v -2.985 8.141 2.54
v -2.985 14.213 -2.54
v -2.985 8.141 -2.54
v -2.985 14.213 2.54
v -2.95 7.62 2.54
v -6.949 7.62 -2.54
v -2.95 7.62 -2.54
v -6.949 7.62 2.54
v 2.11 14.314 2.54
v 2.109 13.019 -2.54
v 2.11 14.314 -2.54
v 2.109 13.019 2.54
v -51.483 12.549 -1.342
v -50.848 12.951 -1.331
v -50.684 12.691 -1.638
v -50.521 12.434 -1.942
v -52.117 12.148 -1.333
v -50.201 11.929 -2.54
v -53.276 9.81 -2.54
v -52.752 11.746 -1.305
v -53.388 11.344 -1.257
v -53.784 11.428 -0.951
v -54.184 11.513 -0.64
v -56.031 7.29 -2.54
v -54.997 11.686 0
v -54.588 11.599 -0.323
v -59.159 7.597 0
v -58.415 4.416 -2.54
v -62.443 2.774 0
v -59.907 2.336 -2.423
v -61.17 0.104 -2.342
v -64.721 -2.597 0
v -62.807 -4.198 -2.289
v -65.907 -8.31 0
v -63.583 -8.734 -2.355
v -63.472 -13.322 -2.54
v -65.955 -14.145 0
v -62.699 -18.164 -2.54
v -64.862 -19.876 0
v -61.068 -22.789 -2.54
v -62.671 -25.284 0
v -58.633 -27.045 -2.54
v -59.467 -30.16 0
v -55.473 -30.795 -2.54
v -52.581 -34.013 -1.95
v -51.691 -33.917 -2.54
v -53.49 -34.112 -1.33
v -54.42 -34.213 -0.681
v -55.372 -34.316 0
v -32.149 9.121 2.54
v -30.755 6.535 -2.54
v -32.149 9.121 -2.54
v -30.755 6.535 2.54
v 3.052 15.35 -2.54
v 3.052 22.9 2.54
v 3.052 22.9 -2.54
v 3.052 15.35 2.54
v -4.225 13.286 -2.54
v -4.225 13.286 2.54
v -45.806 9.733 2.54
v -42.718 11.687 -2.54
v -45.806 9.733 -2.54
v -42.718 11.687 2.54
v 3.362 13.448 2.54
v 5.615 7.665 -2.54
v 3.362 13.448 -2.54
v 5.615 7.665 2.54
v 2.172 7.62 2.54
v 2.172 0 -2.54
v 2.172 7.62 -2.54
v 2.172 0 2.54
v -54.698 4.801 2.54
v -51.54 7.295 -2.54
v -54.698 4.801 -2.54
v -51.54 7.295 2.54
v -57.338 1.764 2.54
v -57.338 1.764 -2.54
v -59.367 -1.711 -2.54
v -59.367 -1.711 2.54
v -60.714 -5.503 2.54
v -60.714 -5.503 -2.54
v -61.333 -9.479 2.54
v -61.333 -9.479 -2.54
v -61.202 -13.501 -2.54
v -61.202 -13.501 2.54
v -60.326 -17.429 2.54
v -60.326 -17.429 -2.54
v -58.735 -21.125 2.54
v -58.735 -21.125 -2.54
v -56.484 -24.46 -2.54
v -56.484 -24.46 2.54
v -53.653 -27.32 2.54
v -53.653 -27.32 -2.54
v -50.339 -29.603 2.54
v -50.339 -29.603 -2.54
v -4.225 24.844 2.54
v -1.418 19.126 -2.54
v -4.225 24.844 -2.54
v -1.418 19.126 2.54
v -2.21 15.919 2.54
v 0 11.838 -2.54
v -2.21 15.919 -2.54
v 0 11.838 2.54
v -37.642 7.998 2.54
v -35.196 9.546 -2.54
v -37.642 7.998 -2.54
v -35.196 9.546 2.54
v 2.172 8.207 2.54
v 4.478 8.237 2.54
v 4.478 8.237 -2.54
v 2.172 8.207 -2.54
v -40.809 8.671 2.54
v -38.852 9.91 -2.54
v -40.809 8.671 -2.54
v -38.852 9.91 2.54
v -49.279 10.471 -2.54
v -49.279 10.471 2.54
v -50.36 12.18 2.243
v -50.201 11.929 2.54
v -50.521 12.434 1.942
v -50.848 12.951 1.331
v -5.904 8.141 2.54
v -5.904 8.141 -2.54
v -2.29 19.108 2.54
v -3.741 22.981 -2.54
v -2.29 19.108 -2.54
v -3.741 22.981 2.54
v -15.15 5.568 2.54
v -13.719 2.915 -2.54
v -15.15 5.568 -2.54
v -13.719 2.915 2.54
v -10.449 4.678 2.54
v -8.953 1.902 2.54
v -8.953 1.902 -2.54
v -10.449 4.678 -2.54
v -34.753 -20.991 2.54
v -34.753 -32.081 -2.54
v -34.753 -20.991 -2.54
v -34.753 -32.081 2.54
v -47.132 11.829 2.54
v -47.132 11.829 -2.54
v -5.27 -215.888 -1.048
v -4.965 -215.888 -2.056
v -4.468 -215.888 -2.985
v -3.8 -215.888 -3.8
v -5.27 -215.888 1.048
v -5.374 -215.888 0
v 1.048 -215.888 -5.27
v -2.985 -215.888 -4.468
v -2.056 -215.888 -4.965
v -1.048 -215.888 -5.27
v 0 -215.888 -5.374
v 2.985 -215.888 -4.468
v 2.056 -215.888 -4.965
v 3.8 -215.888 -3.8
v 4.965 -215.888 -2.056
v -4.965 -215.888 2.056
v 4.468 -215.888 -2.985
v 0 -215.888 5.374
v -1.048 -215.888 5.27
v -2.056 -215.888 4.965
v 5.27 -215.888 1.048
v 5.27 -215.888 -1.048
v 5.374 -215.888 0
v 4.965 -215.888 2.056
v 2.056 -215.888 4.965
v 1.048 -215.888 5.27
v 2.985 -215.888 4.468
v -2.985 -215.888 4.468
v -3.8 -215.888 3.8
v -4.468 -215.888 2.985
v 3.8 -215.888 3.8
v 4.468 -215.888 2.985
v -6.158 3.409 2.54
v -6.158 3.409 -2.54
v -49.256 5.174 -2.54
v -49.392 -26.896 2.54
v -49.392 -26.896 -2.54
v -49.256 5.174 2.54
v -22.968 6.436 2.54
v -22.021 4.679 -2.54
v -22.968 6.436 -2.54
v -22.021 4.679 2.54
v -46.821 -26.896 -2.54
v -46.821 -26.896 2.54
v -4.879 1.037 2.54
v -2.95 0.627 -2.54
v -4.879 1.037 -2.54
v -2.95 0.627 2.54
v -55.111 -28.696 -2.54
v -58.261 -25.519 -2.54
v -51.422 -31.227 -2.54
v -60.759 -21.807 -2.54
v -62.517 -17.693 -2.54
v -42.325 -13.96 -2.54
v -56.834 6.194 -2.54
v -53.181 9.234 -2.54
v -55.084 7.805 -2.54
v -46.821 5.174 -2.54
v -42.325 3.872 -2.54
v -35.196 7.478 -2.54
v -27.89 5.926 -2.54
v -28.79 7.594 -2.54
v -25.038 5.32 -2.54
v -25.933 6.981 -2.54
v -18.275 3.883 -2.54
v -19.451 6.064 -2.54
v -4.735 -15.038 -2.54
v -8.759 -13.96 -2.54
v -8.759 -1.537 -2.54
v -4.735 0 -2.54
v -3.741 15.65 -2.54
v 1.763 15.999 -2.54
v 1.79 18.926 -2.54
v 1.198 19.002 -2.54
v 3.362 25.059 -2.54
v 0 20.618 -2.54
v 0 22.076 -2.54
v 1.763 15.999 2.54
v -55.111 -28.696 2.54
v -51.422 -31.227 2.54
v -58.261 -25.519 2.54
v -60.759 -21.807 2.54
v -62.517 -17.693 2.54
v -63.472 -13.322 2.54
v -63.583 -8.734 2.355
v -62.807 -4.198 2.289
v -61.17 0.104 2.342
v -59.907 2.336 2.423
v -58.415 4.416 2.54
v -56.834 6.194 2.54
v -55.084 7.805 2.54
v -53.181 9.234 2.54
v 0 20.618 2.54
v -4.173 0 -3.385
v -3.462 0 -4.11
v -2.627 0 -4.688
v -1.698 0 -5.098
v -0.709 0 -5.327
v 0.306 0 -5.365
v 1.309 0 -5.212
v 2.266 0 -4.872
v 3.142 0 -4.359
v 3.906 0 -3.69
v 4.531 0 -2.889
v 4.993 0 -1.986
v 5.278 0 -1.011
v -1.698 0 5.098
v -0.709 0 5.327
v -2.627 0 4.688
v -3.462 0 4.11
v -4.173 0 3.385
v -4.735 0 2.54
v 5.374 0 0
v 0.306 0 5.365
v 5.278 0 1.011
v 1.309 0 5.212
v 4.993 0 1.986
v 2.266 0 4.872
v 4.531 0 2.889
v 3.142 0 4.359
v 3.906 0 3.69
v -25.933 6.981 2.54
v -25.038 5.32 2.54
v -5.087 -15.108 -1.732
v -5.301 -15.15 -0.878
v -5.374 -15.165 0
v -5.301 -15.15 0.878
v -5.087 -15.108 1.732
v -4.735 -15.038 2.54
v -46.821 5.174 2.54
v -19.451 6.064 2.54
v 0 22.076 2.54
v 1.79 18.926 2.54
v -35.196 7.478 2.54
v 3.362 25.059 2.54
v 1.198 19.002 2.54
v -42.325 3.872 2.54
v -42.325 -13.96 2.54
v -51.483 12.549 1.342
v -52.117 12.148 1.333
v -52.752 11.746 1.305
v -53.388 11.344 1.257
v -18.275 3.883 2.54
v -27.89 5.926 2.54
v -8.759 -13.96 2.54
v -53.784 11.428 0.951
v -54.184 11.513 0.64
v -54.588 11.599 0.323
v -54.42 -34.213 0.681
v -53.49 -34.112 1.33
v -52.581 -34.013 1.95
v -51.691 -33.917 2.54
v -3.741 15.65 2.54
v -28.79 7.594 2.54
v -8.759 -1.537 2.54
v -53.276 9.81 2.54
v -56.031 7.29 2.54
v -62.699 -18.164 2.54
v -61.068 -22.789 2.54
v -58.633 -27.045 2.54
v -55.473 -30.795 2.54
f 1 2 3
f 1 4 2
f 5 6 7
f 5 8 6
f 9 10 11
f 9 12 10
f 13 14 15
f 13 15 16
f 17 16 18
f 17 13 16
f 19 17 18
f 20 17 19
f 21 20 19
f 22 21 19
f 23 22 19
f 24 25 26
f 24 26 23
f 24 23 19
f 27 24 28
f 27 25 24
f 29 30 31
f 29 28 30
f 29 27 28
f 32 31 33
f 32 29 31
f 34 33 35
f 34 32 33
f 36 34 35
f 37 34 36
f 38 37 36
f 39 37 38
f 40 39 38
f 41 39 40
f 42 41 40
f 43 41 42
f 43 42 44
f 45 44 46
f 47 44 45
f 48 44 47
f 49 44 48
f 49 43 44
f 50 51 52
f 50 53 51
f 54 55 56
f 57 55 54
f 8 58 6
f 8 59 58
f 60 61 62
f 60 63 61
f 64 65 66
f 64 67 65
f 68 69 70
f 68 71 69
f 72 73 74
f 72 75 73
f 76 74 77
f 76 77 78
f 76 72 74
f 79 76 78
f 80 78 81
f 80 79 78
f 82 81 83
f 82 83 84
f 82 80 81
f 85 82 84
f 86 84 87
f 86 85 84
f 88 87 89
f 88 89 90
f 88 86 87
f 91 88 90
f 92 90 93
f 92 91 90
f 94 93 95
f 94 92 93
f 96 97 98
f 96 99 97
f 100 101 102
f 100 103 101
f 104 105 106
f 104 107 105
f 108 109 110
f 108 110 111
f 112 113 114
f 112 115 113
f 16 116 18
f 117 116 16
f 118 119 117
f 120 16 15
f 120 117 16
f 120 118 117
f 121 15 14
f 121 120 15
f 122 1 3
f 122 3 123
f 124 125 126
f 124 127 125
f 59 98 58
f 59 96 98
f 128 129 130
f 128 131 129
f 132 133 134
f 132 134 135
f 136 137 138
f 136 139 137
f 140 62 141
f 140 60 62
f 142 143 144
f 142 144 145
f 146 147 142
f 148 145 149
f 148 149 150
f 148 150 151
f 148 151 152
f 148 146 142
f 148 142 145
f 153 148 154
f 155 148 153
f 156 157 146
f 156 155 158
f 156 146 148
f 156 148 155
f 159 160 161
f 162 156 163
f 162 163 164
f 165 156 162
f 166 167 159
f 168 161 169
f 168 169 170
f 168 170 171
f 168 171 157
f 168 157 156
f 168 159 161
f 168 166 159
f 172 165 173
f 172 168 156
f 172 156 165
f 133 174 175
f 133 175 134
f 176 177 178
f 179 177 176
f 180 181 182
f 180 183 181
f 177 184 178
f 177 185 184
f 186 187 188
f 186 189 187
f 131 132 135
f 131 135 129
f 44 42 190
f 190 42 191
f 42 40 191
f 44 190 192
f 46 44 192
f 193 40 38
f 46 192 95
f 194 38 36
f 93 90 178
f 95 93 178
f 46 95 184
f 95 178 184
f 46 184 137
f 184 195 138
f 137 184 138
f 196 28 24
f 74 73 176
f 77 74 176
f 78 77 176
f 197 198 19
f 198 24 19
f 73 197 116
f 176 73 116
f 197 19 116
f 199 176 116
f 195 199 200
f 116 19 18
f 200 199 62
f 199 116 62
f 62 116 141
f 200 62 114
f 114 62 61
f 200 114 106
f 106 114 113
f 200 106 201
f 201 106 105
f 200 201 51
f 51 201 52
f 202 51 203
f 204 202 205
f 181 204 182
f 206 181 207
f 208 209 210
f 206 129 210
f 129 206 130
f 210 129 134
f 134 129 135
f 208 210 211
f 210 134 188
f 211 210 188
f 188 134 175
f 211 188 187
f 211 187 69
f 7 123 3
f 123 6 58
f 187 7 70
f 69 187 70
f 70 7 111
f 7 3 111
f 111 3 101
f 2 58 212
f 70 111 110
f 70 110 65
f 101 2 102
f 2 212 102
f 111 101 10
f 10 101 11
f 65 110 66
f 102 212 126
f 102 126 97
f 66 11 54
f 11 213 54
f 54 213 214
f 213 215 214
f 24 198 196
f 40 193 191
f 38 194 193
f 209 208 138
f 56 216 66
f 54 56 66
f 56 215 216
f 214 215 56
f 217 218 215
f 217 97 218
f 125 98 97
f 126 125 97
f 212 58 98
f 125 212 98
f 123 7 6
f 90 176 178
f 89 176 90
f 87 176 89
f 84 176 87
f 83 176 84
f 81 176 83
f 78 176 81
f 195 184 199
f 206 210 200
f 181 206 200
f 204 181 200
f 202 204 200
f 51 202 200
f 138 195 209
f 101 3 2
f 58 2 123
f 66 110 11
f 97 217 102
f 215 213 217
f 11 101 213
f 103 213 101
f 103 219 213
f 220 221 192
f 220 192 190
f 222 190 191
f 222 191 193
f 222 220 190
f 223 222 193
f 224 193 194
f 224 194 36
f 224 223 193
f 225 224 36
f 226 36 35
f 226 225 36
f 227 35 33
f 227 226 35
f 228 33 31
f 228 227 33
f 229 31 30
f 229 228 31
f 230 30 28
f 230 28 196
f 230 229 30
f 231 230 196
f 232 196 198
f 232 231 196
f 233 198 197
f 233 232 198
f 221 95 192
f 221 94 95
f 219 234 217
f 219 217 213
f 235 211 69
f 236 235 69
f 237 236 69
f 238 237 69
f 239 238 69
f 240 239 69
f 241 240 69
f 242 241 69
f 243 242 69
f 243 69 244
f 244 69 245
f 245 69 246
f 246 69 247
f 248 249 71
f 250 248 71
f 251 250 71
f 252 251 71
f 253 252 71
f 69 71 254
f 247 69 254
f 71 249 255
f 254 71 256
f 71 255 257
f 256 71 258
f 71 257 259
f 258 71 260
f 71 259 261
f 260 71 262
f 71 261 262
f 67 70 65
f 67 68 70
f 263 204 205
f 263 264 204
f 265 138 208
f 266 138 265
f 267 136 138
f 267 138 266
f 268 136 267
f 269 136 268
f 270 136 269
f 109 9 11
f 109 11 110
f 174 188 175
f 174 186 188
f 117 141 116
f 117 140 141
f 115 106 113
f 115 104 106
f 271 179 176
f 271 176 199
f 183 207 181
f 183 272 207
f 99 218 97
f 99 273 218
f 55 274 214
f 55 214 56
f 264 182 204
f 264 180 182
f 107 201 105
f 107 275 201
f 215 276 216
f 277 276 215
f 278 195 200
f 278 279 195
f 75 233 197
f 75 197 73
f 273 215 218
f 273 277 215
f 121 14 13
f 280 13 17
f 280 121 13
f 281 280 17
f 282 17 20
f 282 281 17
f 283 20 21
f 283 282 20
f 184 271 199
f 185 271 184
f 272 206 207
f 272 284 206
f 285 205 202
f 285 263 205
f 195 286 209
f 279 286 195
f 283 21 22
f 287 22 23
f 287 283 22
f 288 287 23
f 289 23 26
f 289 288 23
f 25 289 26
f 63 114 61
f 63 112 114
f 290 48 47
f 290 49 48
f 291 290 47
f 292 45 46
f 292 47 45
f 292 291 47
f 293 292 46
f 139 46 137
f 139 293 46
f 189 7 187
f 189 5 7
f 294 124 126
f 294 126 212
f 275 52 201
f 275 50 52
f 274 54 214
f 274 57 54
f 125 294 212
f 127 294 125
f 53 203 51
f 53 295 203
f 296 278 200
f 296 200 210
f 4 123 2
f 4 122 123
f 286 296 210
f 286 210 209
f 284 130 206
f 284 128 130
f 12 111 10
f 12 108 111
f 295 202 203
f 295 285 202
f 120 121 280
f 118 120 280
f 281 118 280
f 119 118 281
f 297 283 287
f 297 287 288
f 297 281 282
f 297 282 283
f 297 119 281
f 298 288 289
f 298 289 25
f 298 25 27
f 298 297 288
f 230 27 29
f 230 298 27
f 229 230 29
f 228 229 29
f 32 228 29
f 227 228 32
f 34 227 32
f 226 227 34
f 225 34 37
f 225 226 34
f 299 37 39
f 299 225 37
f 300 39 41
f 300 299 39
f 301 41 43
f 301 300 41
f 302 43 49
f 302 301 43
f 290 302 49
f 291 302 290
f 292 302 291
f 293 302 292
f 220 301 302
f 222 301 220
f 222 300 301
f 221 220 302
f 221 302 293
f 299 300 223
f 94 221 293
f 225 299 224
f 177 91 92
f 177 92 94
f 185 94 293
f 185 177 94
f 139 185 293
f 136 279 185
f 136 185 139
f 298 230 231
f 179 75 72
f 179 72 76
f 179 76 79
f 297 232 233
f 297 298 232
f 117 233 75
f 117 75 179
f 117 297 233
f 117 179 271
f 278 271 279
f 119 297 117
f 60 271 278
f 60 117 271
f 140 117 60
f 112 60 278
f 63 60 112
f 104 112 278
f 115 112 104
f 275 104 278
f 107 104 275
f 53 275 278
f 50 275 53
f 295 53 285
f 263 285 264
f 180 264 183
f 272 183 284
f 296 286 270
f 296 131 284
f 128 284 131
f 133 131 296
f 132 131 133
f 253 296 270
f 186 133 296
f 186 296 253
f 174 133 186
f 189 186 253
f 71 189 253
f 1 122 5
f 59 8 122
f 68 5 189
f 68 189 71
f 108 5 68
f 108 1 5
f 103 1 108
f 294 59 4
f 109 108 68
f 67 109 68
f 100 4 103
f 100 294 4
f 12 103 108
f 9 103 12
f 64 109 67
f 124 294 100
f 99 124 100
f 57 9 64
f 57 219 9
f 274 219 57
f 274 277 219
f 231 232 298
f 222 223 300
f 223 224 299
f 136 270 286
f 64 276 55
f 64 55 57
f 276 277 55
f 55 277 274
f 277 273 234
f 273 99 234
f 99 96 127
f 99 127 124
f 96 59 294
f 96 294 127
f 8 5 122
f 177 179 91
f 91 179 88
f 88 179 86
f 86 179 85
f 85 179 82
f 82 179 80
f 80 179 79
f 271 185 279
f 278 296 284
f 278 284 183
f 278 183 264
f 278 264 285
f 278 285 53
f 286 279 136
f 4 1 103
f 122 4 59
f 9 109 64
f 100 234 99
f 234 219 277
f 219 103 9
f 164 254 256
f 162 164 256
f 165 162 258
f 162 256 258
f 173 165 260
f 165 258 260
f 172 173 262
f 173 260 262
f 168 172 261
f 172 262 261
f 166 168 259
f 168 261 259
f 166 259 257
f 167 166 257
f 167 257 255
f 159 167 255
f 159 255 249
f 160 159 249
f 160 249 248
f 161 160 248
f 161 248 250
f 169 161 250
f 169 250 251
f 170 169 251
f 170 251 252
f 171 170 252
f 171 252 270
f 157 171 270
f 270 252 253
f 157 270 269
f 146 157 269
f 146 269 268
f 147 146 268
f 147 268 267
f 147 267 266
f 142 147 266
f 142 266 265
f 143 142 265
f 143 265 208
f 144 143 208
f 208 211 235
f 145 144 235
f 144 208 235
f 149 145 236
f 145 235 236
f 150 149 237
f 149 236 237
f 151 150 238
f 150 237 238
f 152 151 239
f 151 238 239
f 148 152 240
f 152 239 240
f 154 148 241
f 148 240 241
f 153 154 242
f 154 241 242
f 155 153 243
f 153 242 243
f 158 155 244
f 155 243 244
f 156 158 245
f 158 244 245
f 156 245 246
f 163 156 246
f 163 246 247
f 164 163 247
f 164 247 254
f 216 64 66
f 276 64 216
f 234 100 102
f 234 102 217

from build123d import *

# Parameters (mm, degrees)
F0_R          = 5.373622476
F1_DEPTH      = 215.88753
F3_DEPTH      = 2.54
F3_DEPTH_BACK = 2.54
F4_T2_ANGLE   = 126.5345537541
F4_T4_ANGLE   = 126.5345537541


# Not quite as in the source:
# - a fillet or chamfer that OpenCascade refuses, or shapes differently, is made with other operations: its cross-section is extruded or revolved along the edge and cut away or added


with BuildPart() as f1:
    # F0 (on Front) → F1 (new body)
    with BuildSketch(Plane.XZ):
        Circle(F0_R)
    extrude(amount=F1_DEPTH)

    # F2 (on Top) → F3 (join, two sides)
    with BuildSketch(Plane.XY) as f3_sk:
        Polygon((-8.9527533501, 1.9022722074), (-4.8790749139, 1.0367010286), (-6.158160232, 3.4090294491), align=None)
        Polygon((-13.7193289536, 2.9150694934), (-8.9527533501, 1.9022722074), (-10.4493999233, 4.6781129985), align=None)
        Polygon((-18.2748671635, 3.8830257621), (-13.7193289536, 2.9150694934), (-15.1497123605, 5.5680115299), align=None)
        Polygon((-22.0207331241, 4.6789436692), (-18.2748671635, 3.8830257621), (-19.4510233645, 6.0644508345), align=None)
        Polygon((-25.0378297706, 5.3200133908), (-22.0207331241, 4.6789436692), (-22.9680646536, 6.4359660347), align=None)
        Polygon((-27.890320124, 5.9261077295), (-25.0378297706, 5.3200133908), (-25.9334769328, 6.9811764013), align=None)
        Polygon((-28.7897214748, 7.5942336596), (-30.7547669567, 6.5347425691), (-27.890320124, 5.9261077295), align=None)
        Polygon((-32.1493126453, 9.1212161407), (-35.1961678702, 7.4784470575), (-30.7547669567, 6.5347425691), align=None)
        Polygon((-35.1961678702, 9.5456602661), (-37.6418792182, 7.9981093941), (-35.1961678702, 7.4784470575), align=None)
        Polygon((-38.8515780683, 9.9098877134), (-40.8092972733, 8.6711192604), (-37.6418792182, 7.9981093941), align=None)
        Polygon((-42.7175686579, 11.6869044373), (-45.8058244977, 9.7327764402), (-40.8092972733, 8.6711192604), align=None)
        Polygon((-47.1321087681, 11.8288034913), (-49.2785042842, 10.4706480183), (-45.8058244977, 9.7327764402), align=None)
        Polygon((-50.8480016213, 12.9510430201), (-53.3880016213, 11.343829962), (-49.2785042842, 10.4706480183), align=None)
        Polygon((-2.9497377109, 0), (0, 0), (-2.9497377109, 0.6267573614), align=None)
        Polygon((1.198072837, 19.0015498009), (3.3619815949, 13.447928708), (3.3619815949, 25.0585451722), align=None)
        Polygon((3.0523012392, 22.8999685496), (3.0523012392, 15.3504825952), (1.7903243424, 18.9260840416), align=None, mode=Mode.SUBTRACT)
        Polygon((-4.2252911557, 24.8437412083), (-4.2252911557, 13.2858192763), (-1.4181542095, 19.1259601465), align=None)
        Polygon((-3.7408936769, 22.9805186391), (-2.2895061411, 19.10783723), (-3.7408936769, 15.6503133476), align=None, mode=Mode.SUBTRACT)
        Polygon((-2.9497377109, 0.6267573614), (0, 0), (2.1719516162, 0), (2.1719516162, 7.62), (5.6152132711, 7.6650624399), (3.3619815949, 13.447928708), (1.198072837, 19.0015498009), (0, 22.0763756473), (-1.4181542095, 19.1259601465), (-4.2252911557, 13.2858192763), (-6.9486382417, 7.62), (-2.9497377109, 7.62), align=None)
        Polygon((-2.9854448512, 13.0213079974), (-2.9854448512, 8.1413947046), (-5.9038246982, 8.1413947046), (-2.9854448512, 14.2129721679), align=None, mode=Mode.SUBTRACT)
        Polygon((2.1099960018, 14.3143812405), (4.47795121, 8.2370797172), (2.1719516162, 8.2069007827), (2.1089701391, 13.0193722181), align=None, mode=Mode.SUBTRACT)
        Polygon((-2.2104110103, 15.9188192338), (0, 20.6176694483), (1.7634738469, 15.9993711859), (0, 11.8375318125), align=None, mode=Mode.SUBTRACT)
        with BuildLine():
            Line((-34.7528146772, -32.0806060351), (-34.7528146772, -20.9908965406))
            Line((-34.7528146772, -20.9908965406), (0, -14.0988837661))
            Line((0, -14.0988837661), (0, 0))
            Line((0, 0), (-2.9497377109, 0))
            Line((-2.9497377109, 0), (-2.9497377109, 0.6267573614))
            Line((-2.9497377109, 0.6267573614), (-4.8790749139, 1.0367010286))
            Line((-4.8790749139, 1.0367010286), (-8.9527533501, 1.9022722074))
            Line((-8.9527533501, 1.9022722074), (-13.7193289536, 2.9150694934))
            Line((-13.7193289536, 2.9150694934), (-18.2748671635, 3.8830257621))
            Line((-18.2748671635, 3.8830257621), (-22.0207331241, 4.6789436692))
            Line((-22.0207331241, 4.6789436692), (-25.0378297706, 5.3200133908))
            Line((-25.0378297706, 5.3200133908), (-27.890320124, 5.9261077295))
            Line((-27.890320124, 5.9261077295), (-30.7547669567, 6.5347425691))
            Line((-30.7547669567, 6.5347425691), (-35.1961678702, 7.4784470575))
            Line((-35.1961678702, 7.4784470575), (-37.6418792182, 7.9981093941))
            Line((-37.6418792182, 7.9981093941), (-40.8092972733, 8.6711192604))
            Line((-40.8092972733, 8.6711192604), (-45.8058244977, 9.7327764402))
            Line((-45.8058244977, 9.7327764402), (-49.2785042842, 10.4706480183))
            Line((-49.2785042842, 10.4706480183), (-53.3880016213, 11.343829962))
            Line((-53.3880016213, 11.343829962), (-54.9966600991, 11.6856361297))
            ThreePointArc((-54.9966600991, 11.6856361297), (-66.0747003656, -11.2262862037), (-55.3715413676, -34.3157112426))
            Line((-55.3715413676, -34.3157112426), (-34.7528146772, -32.0806060351))
        make_face()
        with BuildLine():
            ThreePointArc((-51.421571523, -31.2265530229), (-63.6234506771, -11.4887260787), (-53.1807132065, 9.2336507514))
            Line((-53.1807132065, 9.2336507514), (-51.5400195681, 7.2946498786))
            ThreePointArc((-51.5400195681, 7.2946498786), (-61.3618234836, -11.493283063), (-50.339024514, -29.6027325094))
            Line((-50.339024514, -29.6027325094), (-51.421571523, -31.2265530229))
        make_face(mode=Mode.SUBTRACT)
        Polygon((-49.3917986751, -26.8963649869), (-49.256477505, 5.174099002), (-46.8207485974, 5.174099002), (-46.8207485974, -26.8963649869), align=None, mode=Mode.SUBTRACT)
        Polygon((-42.3252023757, 3.8717763964), (-8.7594440334, -1.5370512847), (-8.7594440334, -13.9601901174), (-42.3252023757, -13.9601901174), (-42.3252023757, -1.5370512847), align=None, mode=Mode.SUBTRACT)
    extrude(amount=F3_DEPTH)
    extrude(f3_sk.sketch, amount=-F3_DEPTH_BACK)

    # F4: chamfer of 2.54 on 2 edges, made by hand

    # F4_s1 → F4_t2 (revolve, cut)
    with BuildSketch(Plane(origin=(-33.7752745406, -16.6677099753, 0), x_dir=(0, 0, 1), z_dir=(0.8967506648, 0.4425361512, 0))):
        Polygon((0, -35.5324348562), (2.54, -32.9924348562), (2.54, -35.5324348562), align=None)
    revolve(axis=Axis((-36.340977144, -11.4685968428, 2.54), (0, 0, 1)), revolution_arc=F4_T2_ANGLE, mode=Mode.SUBTRACT)

    # F4_s3 → F4_t4 (revolve, cut)
    with BuildSketch(Plane(origin=(-33.7752745406, -16.6677099753, 0), x_dir=(0, 0, 1), z_dir=(0.8967506648, 0.4425361512, 0))):
        Polygon((-2.54, -32.9924348562), (0, -35.5324348562), (-2.54, -35.5324348562), align=None)
    revolve(axis=Axis((-36.340977144, -11.4685968428, -2.54), (0, 0, 1)), revolution_arc=F4_T4_ANGLE, mode=Mode.SUBTRACT)


solid = f1.part
